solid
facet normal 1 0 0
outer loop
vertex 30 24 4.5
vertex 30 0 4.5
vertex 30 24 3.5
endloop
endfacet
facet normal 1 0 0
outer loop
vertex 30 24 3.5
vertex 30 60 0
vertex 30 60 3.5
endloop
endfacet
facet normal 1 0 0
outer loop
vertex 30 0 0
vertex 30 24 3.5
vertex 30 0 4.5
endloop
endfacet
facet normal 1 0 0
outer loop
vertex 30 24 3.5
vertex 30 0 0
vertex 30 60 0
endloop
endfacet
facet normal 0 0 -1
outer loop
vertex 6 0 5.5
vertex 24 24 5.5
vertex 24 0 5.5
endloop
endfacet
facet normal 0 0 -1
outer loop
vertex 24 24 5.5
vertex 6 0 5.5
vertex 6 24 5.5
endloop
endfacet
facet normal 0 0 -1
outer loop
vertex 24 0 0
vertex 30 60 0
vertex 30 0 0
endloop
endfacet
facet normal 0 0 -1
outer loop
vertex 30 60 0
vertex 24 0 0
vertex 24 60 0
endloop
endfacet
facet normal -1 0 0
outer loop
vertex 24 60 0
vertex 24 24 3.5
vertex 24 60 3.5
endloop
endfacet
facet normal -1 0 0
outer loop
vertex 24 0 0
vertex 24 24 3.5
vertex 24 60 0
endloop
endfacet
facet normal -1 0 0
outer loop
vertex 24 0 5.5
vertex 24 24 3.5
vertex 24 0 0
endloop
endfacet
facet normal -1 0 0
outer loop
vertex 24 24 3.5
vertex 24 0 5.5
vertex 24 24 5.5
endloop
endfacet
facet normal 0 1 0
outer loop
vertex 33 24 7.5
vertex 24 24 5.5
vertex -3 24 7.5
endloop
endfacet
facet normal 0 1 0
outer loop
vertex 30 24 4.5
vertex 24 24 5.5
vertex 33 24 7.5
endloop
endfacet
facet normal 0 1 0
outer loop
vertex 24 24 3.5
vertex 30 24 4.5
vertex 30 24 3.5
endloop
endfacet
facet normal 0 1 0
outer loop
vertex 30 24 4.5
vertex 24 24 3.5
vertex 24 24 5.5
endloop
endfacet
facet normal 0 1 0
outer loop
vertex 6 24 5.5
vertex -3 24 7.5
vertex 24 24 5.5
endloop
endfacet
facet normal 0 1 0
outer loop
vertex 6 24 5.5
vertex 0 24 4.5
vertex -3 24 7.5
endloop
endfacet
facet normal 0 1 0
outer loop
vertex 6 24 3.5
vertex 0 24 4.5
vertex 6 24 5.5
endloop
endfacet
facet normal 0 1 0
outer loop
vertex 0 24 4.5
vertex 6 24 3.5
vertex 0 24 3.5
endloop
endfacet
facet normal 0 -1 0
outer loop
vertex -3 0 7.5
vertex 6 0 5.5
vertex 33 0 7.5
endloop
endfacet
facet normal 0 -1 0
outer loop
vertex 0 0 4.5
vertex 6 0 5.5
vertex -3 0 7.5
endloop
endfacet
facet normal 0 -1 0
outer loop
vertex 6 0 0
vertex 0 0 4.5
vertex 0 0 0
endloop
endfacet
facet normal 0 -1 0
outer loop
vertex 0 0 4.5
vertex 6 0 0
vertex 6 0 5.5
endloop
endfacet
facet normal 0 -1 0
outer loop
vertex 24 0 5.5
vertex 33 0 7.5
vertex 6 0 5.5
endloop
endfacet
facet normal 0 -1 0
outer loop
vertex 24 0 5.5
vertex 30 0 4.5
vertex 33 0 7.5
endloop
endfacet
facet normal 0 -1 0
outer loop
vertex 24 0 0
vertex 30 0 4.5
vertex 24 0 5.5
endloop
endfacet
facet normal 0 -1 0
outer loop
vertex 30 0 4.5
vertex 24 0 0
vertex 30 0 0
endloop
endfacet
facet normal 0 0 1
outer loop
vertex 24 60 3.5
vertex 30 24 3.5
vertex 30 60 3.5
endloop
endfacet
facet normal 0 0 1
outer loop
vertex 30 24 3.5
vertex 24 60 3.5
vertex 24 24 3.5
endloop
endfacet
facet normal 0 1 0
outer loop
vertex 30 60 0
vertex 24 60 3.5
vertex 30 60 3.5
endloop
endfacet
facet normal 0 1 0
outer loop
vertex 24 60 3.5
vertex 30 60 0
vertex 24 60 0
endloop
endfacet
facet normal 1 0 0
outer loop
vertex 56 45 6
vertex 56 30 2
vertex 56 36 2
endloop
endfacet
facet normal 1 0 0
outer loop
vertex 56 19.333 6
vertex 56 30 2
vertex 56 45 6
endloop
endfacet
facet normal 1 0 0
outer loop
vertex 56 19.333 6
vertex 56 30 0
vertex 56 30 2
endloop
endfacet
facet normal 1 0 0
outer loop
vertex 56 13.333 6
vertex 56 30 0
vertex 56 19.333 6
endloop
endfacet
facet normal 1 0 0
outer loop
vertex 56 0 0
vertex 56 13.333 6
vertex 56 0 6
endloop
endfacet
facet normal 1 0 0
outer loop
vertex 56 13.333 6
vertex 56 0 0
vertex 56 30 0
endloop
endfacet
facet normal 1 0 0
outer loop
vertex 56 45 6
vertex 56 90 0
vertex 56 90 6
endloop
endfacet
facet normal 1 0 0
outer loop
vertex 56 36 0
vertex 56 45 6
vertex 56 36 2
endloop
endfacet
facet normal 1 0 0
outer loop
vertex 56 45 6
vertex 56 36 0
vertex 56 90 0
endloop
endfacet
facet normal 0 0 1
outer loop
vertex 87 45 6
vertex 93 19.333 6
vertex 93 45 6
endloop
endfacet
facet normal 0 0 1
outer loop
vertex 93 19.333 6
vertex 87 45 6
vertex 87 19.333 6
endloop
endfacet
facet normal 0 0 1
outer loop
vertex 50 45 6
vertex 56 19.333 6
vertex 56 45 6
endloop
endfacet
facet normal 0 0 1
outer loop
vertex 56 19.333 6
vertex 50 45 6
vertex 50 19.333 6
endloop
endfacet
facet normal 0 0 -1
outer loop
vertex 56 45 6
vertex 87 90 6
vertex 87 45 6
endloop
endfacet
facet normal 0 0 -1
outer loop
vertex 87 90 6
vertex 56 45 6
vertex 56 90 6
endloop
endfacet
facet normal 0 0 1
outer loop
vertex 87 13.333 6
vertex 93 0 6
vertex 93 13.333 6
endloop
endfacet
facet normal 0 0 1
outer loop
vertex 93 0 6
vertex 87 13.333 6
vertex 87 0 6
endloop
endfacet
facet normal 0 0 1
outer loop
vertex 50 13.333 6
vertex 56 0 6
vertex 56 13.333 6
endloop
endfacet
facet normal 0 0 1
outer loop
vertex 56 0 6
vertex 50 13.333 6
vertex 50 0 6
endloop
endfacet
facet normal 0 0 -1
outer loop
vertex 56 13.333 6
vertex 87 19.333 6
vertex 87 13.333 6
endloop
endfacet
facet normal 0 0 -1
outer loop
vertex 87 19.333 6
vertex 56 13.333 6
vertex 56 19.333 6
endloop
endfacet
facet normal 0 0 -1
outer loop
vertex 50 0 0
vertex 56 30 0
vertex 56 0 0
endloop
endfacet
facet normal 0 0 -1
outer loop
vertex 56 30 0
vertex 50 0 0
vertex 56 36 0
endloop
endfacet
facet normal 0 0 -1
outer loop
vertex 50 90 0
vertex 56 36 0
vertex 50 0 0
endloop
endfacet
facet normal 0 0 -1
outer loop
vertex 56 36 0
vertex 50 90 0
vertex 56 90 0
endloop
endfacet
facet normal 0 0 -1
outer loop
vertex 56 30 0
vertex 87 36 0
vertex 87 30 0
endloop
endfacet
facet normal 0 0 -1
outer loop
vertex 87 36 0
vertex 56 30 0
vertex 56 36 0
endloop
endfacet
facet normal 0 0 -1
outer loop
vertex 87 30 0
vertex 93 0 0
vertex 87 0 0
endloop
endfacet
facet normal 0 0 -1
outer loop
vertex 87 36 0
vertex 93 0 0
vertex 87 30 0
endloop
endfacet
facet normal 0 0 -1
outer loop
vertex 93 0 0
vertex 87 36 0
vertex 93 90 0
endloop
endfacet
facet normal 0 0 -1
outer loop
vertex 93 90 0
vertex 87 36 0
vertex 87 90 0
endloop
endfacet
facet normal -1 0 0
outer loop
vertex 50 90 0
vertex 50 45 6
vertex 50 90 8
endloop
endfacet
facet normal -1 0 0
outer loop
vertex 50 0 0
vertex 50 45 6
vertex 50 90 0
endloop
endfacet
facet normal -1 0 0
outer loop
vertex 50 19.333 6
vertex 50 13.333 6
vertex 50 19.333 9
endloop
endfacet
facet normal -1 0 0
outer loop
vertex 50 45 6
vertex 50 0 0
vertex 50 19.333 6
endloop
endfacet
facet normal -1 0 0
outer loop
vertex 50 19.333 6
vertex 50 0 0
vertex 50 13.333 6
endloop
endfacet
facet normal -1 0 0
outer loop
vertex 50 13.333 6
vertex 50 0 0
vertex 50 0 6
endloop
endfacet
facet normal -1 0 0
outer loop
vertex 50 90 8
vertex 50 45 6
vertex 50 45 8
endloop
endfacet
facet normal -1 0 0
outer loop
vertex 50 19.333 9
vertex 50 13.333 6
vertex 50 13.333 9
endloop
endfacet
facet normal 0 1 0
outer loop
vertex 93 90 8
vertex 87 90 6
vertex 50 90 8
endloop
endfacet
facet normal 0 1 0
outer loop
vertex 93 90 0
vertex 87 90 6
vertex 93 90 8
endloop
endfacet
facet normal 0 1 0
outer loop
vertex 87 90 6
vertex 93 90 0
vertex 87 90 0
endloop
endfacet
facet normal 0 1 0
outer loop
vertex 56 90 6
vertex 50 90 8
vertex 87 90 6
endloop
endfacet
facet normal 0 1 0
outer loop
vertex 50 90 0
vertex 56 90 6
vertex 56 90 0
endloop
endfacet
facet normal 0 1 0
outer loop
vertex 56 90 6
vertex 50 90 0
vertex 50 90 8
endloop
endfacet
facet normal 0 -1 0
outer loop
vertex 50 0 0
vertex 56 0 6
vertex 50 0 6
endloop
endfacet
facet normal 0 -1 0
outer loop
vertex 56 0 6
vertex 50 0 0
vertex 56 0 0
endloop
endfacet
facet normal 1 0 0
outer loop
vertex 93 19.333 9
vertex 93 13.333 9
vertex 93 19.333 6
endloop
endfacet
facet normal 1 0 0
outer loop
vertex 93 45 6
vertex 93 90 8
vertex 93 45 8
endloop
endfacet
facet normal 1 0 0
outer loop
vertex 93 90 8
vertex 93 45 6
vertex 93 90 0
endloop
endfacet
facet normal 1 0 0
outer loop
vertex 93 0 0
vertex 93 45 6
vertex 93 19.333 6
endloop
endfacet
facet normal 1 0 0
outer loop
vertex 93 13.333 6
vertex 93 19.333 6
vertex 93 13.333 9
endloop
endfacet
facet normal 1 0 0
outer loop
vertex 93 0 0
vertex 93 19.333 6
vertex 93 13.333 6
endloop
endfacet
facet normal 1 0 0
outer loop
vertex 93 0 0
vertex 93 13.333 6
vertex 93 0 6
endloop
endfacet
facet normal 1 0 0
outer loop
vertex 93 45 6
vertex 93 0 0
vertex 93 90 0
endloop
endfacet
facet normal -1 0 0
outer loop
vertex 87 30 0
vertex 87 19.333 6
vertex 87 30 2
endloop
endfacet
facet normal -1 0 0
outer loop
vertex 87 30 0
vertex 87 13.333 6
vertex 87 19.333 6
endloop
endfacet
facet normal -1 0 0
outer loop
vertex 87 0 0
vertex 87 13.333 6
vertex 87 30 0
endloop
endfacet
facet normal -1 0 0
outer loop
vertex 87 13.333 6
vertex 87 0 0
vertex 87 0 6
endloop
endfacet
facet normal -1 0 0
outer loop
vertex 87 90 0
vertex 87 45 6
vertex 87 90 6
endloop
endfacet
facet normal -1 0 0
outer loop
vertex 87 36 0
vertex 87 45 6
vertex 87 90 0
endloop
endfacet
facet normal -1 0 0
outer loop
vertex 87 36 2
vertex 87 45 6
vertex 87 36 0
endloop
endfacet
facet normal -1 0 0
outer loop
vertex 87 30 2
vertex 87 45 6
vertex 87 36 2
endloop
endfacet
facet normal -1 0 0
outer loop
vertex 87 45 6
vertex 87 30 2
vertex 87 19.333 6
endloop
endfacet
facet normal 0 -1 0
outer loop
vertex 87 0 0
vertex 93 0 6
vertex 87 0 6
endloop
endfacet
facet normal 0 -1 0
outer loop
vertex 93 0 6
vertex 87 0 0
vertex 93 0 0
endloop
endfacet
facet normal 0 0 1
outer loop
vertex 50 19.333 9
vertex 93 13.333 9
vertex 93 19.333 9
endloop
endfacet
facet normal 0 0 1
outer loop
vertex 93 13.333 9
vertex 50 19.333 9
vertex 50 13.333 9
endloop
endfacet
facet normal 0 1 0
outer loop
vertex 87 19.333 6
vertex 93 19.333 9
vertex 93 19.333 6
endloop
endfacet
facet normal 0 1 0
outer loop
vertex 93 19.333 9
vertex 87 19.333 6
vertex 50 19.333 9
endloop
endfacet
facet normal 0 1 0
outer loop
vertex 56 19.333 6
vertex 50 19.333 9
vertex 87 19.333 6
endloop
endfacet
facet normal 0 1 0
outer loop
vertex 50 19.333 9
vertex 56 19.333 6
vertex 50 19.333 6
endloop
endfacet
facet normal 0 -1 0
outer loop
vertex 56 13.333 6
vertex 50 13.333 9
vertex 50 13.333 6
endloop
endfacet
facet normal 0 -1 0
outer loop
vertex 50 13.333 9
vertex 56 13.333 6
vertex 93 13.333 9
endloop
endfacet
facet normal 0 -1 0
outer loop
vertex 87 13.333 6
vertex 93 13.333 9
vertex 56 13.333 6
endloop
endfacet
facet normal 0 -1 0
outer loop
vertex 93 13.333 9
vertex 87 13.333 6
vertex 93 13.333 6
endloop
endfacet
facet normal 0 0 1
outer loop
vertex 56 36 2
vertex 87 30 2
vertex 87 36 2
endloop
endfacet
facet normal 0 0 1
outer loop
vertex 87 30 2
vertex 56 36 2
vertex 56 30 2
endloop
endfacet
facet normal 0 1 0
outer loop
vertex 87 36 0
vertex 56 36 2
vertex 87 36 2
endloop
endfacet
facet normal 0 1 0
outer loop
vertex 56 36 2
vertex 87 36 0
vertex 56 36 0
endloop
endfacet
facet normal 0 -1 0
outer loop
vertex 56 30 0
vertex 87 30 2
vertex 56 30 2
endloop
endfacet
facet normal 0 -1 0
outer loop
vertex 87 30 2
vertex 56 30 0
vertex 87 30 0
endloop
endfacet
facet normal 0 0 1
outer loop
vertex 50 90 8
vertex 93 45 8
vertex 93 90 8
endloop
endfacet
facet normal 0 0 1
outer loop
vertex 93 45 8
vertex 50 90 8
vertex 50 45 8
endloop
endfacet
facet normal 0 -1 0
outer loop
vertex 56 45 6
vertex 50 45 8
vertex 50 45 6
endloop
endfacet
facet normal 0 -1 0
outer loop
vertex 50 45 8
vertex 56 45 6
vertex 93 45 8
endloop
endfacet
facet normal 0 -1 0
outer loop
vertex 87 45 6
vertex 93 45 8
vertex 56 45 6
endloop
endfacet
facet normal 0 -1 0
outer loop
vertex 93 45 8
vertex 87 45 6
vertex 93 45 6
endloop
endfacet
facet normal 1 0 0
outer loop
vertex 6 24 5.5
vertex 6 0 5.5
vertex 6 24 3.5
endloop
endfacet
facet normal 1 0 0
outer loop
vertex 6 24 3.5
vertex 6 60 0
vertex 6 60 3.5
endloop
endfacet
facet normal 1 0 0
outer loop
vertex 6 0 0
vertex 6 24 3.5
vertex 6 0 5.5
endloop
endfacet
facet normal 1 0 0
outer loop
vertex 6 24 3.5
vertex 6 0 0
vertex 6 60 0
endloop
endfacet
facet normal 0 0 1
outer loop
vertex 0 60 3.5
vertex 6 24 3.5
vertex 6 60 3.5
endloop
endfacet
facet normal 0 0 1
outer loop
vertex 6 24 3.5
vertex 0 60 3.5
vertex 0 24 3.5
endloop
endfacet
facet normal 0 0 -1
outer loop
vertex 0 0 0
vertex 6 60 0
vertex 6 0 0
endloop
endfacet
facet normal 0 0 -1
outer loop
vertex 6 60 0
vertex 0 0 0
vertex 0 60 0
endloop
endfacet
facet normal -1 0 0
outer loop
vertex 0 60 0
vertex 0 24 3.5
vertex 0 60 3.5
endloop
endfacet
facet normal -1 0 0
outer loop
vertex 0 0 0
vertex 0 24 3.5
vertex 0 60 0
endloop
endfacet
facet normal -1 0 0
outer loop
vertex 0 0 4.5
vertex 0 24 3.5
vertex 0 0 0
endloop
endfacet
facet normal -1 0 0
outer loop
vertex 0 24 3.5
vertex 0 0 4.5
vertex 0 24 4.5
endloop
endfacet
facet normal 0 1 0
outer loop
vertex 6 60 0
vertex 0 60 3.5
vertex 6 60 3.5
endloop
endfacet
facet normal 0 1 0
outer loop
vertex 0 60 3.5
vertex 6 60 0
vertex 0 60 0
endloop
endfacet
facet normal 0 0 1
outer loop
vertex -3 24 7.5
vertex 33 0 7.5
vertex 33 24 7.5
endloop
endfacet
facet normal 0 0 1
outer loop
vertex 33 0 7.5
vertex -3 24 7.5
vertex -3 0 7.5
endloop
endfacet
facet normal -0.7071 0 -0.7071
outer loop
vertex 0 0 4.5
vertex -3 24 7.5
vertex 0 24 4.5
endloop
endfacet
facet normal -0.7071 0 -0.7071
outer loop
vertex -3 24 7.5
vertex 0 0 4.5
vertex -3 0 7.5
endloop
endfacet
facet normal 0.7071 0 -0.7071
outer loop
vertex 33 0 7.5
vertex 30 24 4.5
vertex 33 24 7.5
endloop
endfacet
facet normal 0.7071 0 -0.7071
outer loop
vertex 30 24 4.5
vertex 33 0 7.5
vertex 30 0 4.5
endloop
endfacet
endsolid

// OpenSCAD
//distance between legs
dl = 24;

//leg width
lw = 6;

//leg thickness
lth = 6;

//leg length
ll = 60;

//give between legs and legs

give = .5;



//legs
cube([lw, ll, lth-2-give]);
cube([lw, 2*ll/5, lth-give]);
translate([dl,0,0])
{
cube([lw, 2*ll/5, lth-give]);
cube([lw, ll, lth-2-give]);
}

//seat
translate([0,0,lth-give])
cube([dl+lw, 2*ll/5, 2]);



translate([-lw/2,0,lth-give+2])
rotate([-90,0,0])
linear_extrude(height=2*ll/5)
polygon(points=[[0,0],[lw,0],[lw,lw]]);



translate([lw/2+dl,0,lth-lw-give+2])
rotate([-90,-90,0])
linear_extrude(height=2*ll/5)
polygon(points=[[0,0],[lw,0],[lw,lw]]);



//back support
translate([50,0,0]){

//legs
cube([lw, ll*1.5, lth]);
translate([dl+lw*2+give*2,0,0])
cube([lw, ll*1.5, lth]);


//bars
translate([0,ll/4.5,lth])
cube([dl+lw*2+give*2+lw, lw, 3]);


translate([0,ll/2,0])
cube([dl+lw*2+give*2+lw, lw, 2]);

//seat
translate([0,ll*3/4,lth])
{
cube([dl+lw*3+give*2, ll*3/4, 2]);

}




}
